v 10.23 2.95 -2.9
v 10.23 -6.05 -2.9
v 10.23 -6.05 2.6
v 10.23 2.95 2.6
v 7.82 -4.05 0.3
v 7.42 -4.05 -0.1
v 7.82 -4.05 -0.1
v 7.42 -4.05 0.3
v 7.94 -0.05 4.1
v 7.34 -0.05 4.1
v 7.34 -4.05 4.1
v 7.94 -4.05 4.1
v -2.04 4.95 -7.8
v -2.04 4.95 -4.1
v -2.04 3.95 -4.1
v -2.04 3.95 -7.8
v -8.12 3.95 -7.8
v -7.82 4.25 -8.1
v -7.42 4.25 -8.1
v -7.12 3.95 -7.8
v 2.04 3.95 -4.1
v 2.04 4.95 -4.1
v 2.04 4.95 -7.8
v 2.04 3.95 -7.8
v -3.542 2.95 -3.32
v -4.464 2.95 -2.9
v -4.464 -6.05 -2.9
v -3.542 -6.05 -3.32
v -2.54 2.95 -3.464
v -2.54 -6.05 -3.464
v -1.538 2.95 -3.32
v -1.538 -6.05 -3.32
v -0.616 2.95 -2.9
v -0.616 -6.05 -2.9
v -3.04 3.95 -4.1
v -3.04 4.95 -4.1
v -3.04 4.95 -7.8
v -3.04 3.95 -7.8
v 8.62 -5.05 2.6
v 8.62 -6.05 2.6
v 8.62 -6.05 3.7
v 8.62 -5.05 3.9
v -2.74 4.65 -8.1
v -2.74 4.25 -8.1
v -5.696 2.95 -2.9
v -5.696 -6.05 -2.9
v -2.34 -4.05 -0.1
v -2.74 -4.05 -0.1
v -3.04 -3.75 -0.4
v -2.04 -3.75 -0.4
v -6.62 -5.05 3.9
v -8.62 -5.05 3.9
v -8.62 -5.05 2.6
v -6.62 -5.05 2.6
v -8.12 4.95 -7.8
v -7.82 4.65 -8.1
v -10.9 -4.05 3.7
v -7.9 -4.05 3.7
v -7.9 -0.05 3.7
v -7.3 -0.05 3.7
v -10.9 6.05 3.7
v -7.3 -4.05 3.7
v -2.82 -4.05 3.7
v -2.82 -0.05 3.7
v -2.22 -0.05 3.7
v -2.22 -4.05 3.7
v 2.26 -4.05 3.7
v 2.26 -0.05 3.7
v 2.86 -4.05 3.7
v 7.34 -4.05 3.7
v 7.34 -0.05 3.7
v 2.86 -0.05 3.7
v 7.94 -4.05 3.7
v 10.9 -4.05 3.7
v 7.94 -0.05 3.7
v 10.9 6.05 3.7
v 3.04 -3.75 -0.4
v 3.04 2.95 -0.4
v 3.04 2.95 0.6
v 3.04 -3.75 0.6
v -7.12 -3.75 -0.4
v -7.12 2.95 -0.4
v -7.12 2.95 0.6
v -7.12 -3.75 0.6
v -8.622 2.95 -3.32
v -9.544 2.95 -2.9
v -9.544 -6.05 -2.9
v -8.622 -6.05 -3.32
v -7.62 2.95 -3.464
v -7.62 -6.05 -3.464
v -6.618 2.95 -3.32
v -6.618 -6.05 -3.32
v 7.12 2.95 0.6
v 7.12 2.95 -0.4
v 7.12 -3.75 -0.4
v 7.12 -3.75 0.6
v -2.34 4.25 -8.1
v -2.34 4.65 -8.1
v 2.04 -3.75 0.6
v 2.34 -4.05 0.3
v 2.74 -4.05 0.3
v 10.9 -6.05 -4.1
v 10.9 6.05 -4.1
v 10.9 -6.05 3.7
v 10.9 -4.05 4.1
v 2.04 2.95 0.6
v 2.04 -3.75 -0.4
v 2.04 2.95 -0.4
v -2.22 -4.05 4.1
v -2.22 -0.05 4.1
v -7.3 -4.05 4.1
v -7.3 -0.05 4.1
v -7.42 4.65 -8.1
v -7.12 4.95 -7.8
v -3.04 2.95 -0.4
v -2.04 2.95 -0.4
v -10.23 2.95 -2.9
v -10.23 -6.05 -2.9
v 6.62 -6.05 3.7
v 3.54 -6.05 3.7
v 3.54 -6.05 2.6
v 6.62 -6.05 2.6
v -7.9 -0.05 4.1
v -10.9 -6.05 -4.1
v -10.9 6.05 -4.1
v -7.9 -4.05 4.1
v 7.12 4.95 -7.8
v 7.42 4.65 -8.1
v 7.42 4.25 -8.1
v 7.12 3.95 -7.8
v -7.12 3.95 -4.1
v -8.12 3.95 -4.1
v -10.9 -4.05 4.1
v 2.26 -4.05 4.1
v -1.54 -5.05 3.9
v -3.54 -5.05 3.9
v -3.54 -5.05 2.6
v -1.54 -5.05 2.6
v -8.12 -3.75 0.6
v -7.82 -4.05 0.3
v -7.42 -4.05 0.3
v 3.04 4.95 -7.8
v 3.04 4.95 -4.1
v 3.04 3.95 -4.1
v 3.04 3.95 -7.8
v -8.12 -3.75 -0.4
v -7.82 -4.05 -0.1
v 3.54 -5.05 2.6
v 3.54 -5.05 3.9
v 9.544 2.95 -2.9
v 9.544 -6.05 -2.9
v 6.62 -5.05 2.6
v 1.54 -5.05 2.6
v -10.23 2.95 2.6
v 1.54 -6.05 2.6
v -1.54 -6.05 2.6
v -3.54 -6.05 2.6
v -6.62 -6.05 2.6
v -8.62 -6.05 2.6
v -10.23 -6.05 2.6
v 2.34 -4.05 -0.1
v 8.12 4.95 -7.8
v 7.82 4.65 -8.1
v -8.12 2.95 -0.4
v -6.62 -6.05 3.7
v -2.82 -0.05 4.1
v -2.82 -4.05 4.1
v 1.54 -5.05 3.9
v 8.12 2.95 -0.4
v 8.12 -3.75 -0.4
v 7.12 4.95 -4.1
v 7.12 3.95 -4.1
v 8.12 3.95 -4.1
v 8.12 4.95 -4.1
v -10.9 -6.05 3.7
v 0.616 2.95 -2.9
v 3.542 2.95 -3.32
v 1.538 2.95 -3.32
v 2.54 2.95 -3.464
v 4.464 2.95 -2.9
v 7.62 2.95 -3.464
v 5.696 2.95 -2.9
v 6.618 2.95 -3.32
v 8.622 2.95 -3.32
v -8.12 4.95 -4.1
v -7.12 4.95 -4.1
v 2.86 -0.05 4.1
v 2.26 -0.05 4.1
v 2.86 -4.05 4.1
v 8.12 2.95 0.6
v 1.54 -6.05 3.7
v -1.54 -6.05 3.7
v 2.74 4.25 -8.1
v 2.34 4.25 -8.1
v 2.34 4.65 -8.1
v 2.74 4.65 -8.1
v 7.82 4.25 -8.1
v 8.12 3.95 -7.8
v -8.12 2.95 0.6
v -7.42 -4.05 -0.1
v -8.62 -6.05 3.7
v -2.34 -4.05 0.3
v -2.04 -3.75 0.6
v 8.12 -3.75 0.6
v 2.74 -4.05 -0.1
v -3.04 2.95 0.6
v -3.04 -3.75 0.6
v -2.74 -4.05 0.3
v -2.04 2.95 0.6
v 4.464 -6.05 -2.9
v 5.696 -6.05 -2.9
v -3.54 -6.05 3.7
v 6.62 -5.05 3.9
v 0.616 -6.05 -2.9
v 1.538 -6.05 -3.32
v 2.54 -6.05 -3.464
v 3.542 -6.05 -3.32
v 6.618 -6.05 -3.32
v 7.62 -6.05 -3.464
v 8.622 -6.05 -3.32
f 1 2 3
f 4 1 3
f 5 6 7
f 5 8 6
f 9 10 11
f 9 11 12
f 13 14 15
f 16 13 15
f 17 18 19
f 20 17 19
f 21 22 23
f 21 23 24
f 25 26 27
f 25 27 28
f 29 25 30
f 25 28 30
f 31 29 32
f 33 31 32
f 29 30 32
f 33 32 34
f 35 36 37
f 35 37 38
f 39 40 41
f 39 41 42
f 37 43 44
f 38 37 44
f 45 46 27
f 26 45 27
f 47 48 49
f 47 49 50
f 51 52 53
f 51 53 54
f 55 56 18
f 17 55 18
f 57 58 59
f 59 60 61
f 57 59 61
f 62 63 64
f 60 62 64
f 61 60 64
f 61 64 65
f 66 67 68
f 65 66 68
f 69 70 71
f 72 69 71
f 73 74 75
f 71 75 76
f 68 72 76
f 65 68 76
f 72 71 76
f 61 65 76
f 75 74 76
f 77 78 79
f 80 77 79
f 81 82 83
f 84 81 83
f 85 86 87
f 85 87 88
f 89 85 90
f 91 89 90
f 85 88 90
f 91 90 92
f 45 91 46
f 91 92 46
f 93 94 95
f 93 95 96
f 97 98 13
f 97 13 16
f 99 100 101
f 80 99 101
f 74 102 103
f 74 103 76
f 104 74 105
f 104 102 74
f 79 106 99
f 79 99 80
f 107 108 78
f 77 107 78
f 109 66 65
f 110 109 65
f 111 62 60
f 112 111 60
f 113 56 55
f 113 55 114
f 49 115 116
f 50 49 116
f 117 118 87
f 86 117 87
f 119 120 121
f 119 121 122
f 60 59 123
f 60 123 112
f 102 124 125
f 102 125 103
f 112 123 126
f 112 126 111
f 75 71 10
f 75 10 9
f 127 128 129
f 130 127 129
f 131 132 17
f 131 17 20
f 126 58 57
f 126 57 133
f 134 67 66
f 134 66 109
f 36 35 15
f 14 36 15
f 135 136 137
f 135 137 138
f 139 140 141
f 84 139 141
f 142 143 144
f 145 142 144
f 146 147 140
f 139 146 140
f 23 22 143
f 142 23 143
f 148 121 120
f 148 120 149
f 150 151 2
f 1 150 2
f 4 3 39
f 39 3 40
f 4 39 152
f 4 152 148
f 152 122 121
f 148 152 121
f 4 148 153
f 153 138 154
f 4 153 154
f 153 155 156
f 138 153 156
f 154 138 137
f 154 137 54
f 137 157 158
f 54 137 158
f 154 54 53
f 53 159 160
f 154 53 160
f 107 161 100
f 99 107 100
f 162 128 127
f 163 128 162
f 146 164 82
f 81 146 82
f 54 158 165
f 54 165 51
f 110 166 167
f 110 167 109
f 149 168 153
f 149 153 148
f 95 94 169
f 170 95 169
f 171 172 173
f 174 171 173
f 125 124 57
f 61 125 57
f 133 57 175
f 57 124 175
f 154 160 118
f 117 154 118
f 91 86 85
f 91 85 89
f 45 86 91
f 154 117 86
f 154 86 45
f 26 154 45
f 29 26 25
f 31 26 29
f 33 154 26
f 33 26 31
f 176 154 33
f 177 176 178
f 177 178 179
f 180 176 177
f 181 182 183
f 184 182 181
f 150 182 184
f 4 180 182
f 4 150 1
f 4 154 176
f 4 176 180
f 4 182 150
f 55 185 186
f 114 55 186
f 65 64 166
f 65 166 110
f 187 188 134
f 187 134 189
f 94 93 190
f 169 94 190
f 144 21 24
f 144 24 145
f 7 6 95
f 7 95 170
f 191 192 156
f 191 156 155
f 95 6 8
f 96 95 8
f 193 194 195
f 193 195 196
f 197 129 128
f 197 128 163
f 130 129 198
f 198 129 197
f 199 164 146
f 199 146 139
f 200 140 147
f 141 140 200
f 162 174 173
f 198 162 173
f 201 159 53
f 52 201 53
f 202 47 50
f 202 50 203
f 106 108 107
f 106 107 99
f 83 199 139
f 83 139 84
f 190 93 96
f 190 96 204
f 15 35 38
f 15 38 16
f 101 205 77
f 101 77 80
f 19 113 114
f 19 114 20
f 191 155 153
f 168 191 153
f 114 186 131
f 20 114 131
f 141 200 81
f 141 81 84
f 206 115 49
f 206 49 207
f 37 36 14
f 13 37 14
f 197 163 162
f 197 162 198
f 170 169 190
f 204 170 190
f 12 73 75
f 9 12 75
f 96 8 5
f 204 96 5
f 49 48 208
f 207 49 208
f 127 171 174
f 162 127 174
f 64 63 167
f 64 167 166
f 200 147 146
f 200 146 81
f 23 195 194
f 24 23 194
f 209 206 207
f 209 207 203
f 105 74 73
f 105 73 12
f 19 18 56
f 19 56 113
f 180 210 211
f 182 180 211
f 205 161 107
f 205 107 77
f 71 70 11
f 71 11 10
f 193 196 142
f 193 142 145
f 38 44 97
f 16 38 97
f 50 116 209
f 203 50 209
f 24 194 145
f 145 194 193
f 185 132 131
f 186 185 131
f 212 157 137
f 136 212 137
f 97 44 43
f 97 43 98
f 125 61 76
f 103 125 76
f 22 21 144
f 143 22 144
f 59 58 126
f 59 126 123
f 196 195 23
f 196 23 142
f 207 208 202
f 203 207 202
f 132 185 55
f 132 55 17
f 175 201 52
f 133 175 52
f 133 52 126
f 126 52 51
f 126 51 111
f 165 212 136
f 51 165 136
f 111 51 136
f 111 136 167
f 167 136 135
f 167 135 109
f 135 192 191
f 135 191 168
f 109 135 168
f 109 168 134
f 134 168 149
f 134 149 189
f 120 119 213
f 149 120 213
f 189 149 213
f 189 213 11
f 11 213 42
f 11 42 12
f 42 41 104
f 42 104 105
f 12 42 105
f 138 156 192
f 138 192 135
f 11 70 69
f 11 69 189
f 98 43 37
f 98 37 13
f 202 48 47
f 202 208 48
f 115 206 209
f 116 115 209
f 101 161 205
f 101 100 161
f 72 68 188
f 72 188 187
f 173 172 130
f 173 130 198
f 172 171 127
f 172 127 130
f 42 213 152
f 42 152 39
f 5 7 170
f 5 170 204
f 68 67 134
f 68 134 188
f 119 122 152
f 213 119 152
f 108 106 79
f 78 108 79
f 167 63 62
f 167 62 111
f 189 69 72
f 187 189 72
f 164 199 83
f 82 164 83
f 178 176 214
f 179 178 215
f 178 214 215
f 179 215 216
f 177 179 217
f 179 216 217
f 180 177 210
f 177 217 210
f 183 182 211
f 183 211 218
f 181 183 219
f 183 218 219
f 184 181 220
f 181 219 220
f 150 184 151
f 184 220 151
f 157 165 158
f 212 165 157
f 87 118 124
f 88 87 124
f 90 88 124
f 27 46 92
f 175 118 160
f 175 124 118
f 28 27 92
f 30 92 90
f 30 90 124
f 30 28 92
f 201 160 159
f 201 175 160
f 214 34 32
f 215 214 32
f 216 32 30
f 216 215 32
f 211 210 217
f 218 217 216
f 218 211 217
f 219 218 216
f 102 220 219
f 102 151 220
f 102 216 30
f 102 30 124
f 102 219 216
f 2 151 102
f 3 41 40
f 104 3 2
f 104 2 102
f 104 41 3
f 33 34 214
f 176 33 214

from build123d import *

# Parameters (mm, degrees)
F0_W       = 21.8
F0_H       = 8.2
F1_DEPTH   = 6.05
F3_DEPTH   = 9
F4_W       = 1
F4_H       = 1
F5_DEPTH   = 7
F6_W       = 1
F6_H       = 1
F7_DEPTH   = 4
F8_W       = 2
F8_H       = 1
F9_DEPTH   = 2
F10_W      = 20.46
F10_H      = 0.5
F11_DEPTH  = 9
F12_SIZE   = 0.3
F12_2_SIZE = 0.3
F13_W      = 10.1
F13_H      = 0.4
F14_DEPTH  = 21.801
F15_W      = 0.6
F15_H      = 4
F16_DEPTH  = 0.4


with BuildPart() as f1:
    # F0 (on Front) → F1 (new body, symmetric)
    with BuildSketch(Plane.XZ):
        Rectangle(F0_W, F0_H)
    extrude(amount=F1_DEPTH, both=True)

    # F2 (on face) → F3 (cut)
    with BuildSketch(Plane.XZ.offset(6.05)):
        with BuildLine():
            Line((10.23, 2.6), (-10.23, 2.6))
            Line((-10.23, 2.6), (-10.23, -2.4))
            Line((-10.23, -2.4), (-10.16, -2.4))
            ThreePointArc((-10.16, -2.4), (-7.62, -3.46393), (-5.08, -2.4))
            ThreePointArc((-5.08, -2.4), (-2.54, -3.46393), (0, -2.4))
            ThreePointArc((0, -2.4), (2.54, -3.46393), (5.08, -2.4))
            ThreePointArc((5.08, -2.4), (7.62, -3.46393), (10.16, -2.4))
            Line((10.16, -2.4), (10.23, -2.4))
            Line((10.23, -2.4), (10.23, 2.6))
        make_face()
    extrude(amount=-F3_DEPTH, mode=Mode.SUBTRACT)

    # F8 (on face) → F9 (cut)
    with BuildSketch(Plane.XY.offset(4.1)):
        with Locations((-2.54, -5.55)):
            Rectangle(F8_W, F8_H)
        with Locations((2.54, -5.55)):
            Rectangle(F8_W, F8_H)
        with Locations((7.62, -5.55)):
            Rectangle(F8_W, F8_H)
        with Locations((-7.62, -5.55)):
            Rectangle(F8_W, F8_H)
    extrude(amount=-F9_DEPTH, mode=Mode.SUBTRACT)

    # F10 (on face) → F11 (cut, through all)
    with BuildSketch(Plane.XZ.offset(6.05)):
        with Locations((0, -2.65)):
            Rectangle(F10_W, F10_H)
    extrude(amount=-F11_DEPTH, mode=Mode.SUBTRACT)

    # F13 (on face) → F14 (cut, through all)
    with BuildSketch(Plane.YZ.offset(10.9)):
        Polygon((-4.05, 4.1), (-6.05, 4.1), (-6.05, 3.7), align=None)
        with Locations((1, 3.9)):
            Rectangle(F13_W, F13_H)
    extrude(amount=-F14_DEPTH, mode=Mode.SUBTRACT)

    # F15 (on face) → F16 (join)
    with BuildSketch(Plane.XY.offset(3.7)):
        with Locations((-7.6, -2.05)):
            Rectangle(F15_W, F15_H)
        with Locations((-2.52, -2.05)):
            Rectangle(F15_W, F15_H)
        with Locations((2.56, -2.05)):
            Rectangle(F15_W, F15_H)
        with Locations((7.64, -2.05)):
            Rectangle(F15_W, F15_H)
    extrude(amount=F16_DEPTH)


with BuildPart() as f5:
    # F4 (on face) → F5 (new body)
    with BuildSketch(Plane.XZ.offset(-2.95)):
        with Locations((-7.62, 0.1)):
            Rectangle(F4_W, F4_H)
        with Locations((-2.54, 0.1)):
            Rectangle(F4_W, F4_H)
        with Locations((2.54, 0.1)):
            Rectangle(F4_W, F4_H)
        with Locations((7.62, 0.1)):
            Rectangle(F4_W, F4_H)
    extrude(amount=F5_DEPTH)

    # F12
    f12_edges = [f5.edges().sort_by_distance(p)[0] for p in [
        (-7.62, -4.05, -0.4),
        (-7.12, -4.05, 0.1),
        (-7.62, -4.05, 0.6),
        (-8.12, -4.05, 0.1),
        (-2.54, -4.05, -0.4),
        (-2.04, -4.05, 0.1),
        (-2.54, -4.05, 0.6),
        (-3.04, -4.05, 0.1),
        (2.54, -4.05, -0.4),
        (3.04, -4.05, 0.1),
        (2.54, -4.05, 0.6),
        (2.04, -4.05, 0.1),
        (7.62, -4.05, -0.4),
        (8.12, -4.05, 0.1),
        (7.62, -4.05, 0.6),
        (7.12, -4.05, 0.1),
    ]]
    chamfer(f12_edges, length=F12_SIZE)


with BuildPart() as f7:
    # F6 (on face) → F7 (new body)
    with BuildSketch(Plane(origin=(0, 0, -4.1), x_dir=(1, 0, 0), z_dir=(0, 0, -1))):
        with Locations((-7.62, -4.45)):
            Rectangle(F6_W, F6_H)
        with Locations((-2.54, -4.45)):
            Rectangle(F6_W, F6_H)
        with Locations((7.62, -4.45)):
            Rectangle(F6_W, F6_H)
        with Locations((2.54, -4.45)):
            Rectangle(F6_W, F6_H)
    extrude(amount=F7_DEPTH)

    # F12#2
    f12_2_edges = [f7.edges().sort_by_distance(p)[0] for p in [
        (-7.62, 3.95, -8.1),
        (-8.12, 4.45, -8.1),
        (-7.62, 4.95, -8.1),
        (-7.12, 4.45, -8.1),
        (-2.54, 3.95, -8.1),
        (-3.04, 4.45, -8.1),
        (-2.54, 4.95, -8.1),
        (-2.04, 4.45, -8.1),
        (3.04, 4.45, -8.1),
        (2.54, 3.95, -8.1),
        (2.04, 4.45, -8.1),
        (2.54, 4.95, -8.1),
        (8.12, 4.45, -8.1),
        (7.62, 3.95, -8.1),
        (7.12, 4.45, -8.1),
        (7.62, 4.95, -8.1),
    ]]
    chamfer(f12_2_edges, length=F12_2_SIZE)


solid = Compound([f1.part, f5.part, f7.part])
